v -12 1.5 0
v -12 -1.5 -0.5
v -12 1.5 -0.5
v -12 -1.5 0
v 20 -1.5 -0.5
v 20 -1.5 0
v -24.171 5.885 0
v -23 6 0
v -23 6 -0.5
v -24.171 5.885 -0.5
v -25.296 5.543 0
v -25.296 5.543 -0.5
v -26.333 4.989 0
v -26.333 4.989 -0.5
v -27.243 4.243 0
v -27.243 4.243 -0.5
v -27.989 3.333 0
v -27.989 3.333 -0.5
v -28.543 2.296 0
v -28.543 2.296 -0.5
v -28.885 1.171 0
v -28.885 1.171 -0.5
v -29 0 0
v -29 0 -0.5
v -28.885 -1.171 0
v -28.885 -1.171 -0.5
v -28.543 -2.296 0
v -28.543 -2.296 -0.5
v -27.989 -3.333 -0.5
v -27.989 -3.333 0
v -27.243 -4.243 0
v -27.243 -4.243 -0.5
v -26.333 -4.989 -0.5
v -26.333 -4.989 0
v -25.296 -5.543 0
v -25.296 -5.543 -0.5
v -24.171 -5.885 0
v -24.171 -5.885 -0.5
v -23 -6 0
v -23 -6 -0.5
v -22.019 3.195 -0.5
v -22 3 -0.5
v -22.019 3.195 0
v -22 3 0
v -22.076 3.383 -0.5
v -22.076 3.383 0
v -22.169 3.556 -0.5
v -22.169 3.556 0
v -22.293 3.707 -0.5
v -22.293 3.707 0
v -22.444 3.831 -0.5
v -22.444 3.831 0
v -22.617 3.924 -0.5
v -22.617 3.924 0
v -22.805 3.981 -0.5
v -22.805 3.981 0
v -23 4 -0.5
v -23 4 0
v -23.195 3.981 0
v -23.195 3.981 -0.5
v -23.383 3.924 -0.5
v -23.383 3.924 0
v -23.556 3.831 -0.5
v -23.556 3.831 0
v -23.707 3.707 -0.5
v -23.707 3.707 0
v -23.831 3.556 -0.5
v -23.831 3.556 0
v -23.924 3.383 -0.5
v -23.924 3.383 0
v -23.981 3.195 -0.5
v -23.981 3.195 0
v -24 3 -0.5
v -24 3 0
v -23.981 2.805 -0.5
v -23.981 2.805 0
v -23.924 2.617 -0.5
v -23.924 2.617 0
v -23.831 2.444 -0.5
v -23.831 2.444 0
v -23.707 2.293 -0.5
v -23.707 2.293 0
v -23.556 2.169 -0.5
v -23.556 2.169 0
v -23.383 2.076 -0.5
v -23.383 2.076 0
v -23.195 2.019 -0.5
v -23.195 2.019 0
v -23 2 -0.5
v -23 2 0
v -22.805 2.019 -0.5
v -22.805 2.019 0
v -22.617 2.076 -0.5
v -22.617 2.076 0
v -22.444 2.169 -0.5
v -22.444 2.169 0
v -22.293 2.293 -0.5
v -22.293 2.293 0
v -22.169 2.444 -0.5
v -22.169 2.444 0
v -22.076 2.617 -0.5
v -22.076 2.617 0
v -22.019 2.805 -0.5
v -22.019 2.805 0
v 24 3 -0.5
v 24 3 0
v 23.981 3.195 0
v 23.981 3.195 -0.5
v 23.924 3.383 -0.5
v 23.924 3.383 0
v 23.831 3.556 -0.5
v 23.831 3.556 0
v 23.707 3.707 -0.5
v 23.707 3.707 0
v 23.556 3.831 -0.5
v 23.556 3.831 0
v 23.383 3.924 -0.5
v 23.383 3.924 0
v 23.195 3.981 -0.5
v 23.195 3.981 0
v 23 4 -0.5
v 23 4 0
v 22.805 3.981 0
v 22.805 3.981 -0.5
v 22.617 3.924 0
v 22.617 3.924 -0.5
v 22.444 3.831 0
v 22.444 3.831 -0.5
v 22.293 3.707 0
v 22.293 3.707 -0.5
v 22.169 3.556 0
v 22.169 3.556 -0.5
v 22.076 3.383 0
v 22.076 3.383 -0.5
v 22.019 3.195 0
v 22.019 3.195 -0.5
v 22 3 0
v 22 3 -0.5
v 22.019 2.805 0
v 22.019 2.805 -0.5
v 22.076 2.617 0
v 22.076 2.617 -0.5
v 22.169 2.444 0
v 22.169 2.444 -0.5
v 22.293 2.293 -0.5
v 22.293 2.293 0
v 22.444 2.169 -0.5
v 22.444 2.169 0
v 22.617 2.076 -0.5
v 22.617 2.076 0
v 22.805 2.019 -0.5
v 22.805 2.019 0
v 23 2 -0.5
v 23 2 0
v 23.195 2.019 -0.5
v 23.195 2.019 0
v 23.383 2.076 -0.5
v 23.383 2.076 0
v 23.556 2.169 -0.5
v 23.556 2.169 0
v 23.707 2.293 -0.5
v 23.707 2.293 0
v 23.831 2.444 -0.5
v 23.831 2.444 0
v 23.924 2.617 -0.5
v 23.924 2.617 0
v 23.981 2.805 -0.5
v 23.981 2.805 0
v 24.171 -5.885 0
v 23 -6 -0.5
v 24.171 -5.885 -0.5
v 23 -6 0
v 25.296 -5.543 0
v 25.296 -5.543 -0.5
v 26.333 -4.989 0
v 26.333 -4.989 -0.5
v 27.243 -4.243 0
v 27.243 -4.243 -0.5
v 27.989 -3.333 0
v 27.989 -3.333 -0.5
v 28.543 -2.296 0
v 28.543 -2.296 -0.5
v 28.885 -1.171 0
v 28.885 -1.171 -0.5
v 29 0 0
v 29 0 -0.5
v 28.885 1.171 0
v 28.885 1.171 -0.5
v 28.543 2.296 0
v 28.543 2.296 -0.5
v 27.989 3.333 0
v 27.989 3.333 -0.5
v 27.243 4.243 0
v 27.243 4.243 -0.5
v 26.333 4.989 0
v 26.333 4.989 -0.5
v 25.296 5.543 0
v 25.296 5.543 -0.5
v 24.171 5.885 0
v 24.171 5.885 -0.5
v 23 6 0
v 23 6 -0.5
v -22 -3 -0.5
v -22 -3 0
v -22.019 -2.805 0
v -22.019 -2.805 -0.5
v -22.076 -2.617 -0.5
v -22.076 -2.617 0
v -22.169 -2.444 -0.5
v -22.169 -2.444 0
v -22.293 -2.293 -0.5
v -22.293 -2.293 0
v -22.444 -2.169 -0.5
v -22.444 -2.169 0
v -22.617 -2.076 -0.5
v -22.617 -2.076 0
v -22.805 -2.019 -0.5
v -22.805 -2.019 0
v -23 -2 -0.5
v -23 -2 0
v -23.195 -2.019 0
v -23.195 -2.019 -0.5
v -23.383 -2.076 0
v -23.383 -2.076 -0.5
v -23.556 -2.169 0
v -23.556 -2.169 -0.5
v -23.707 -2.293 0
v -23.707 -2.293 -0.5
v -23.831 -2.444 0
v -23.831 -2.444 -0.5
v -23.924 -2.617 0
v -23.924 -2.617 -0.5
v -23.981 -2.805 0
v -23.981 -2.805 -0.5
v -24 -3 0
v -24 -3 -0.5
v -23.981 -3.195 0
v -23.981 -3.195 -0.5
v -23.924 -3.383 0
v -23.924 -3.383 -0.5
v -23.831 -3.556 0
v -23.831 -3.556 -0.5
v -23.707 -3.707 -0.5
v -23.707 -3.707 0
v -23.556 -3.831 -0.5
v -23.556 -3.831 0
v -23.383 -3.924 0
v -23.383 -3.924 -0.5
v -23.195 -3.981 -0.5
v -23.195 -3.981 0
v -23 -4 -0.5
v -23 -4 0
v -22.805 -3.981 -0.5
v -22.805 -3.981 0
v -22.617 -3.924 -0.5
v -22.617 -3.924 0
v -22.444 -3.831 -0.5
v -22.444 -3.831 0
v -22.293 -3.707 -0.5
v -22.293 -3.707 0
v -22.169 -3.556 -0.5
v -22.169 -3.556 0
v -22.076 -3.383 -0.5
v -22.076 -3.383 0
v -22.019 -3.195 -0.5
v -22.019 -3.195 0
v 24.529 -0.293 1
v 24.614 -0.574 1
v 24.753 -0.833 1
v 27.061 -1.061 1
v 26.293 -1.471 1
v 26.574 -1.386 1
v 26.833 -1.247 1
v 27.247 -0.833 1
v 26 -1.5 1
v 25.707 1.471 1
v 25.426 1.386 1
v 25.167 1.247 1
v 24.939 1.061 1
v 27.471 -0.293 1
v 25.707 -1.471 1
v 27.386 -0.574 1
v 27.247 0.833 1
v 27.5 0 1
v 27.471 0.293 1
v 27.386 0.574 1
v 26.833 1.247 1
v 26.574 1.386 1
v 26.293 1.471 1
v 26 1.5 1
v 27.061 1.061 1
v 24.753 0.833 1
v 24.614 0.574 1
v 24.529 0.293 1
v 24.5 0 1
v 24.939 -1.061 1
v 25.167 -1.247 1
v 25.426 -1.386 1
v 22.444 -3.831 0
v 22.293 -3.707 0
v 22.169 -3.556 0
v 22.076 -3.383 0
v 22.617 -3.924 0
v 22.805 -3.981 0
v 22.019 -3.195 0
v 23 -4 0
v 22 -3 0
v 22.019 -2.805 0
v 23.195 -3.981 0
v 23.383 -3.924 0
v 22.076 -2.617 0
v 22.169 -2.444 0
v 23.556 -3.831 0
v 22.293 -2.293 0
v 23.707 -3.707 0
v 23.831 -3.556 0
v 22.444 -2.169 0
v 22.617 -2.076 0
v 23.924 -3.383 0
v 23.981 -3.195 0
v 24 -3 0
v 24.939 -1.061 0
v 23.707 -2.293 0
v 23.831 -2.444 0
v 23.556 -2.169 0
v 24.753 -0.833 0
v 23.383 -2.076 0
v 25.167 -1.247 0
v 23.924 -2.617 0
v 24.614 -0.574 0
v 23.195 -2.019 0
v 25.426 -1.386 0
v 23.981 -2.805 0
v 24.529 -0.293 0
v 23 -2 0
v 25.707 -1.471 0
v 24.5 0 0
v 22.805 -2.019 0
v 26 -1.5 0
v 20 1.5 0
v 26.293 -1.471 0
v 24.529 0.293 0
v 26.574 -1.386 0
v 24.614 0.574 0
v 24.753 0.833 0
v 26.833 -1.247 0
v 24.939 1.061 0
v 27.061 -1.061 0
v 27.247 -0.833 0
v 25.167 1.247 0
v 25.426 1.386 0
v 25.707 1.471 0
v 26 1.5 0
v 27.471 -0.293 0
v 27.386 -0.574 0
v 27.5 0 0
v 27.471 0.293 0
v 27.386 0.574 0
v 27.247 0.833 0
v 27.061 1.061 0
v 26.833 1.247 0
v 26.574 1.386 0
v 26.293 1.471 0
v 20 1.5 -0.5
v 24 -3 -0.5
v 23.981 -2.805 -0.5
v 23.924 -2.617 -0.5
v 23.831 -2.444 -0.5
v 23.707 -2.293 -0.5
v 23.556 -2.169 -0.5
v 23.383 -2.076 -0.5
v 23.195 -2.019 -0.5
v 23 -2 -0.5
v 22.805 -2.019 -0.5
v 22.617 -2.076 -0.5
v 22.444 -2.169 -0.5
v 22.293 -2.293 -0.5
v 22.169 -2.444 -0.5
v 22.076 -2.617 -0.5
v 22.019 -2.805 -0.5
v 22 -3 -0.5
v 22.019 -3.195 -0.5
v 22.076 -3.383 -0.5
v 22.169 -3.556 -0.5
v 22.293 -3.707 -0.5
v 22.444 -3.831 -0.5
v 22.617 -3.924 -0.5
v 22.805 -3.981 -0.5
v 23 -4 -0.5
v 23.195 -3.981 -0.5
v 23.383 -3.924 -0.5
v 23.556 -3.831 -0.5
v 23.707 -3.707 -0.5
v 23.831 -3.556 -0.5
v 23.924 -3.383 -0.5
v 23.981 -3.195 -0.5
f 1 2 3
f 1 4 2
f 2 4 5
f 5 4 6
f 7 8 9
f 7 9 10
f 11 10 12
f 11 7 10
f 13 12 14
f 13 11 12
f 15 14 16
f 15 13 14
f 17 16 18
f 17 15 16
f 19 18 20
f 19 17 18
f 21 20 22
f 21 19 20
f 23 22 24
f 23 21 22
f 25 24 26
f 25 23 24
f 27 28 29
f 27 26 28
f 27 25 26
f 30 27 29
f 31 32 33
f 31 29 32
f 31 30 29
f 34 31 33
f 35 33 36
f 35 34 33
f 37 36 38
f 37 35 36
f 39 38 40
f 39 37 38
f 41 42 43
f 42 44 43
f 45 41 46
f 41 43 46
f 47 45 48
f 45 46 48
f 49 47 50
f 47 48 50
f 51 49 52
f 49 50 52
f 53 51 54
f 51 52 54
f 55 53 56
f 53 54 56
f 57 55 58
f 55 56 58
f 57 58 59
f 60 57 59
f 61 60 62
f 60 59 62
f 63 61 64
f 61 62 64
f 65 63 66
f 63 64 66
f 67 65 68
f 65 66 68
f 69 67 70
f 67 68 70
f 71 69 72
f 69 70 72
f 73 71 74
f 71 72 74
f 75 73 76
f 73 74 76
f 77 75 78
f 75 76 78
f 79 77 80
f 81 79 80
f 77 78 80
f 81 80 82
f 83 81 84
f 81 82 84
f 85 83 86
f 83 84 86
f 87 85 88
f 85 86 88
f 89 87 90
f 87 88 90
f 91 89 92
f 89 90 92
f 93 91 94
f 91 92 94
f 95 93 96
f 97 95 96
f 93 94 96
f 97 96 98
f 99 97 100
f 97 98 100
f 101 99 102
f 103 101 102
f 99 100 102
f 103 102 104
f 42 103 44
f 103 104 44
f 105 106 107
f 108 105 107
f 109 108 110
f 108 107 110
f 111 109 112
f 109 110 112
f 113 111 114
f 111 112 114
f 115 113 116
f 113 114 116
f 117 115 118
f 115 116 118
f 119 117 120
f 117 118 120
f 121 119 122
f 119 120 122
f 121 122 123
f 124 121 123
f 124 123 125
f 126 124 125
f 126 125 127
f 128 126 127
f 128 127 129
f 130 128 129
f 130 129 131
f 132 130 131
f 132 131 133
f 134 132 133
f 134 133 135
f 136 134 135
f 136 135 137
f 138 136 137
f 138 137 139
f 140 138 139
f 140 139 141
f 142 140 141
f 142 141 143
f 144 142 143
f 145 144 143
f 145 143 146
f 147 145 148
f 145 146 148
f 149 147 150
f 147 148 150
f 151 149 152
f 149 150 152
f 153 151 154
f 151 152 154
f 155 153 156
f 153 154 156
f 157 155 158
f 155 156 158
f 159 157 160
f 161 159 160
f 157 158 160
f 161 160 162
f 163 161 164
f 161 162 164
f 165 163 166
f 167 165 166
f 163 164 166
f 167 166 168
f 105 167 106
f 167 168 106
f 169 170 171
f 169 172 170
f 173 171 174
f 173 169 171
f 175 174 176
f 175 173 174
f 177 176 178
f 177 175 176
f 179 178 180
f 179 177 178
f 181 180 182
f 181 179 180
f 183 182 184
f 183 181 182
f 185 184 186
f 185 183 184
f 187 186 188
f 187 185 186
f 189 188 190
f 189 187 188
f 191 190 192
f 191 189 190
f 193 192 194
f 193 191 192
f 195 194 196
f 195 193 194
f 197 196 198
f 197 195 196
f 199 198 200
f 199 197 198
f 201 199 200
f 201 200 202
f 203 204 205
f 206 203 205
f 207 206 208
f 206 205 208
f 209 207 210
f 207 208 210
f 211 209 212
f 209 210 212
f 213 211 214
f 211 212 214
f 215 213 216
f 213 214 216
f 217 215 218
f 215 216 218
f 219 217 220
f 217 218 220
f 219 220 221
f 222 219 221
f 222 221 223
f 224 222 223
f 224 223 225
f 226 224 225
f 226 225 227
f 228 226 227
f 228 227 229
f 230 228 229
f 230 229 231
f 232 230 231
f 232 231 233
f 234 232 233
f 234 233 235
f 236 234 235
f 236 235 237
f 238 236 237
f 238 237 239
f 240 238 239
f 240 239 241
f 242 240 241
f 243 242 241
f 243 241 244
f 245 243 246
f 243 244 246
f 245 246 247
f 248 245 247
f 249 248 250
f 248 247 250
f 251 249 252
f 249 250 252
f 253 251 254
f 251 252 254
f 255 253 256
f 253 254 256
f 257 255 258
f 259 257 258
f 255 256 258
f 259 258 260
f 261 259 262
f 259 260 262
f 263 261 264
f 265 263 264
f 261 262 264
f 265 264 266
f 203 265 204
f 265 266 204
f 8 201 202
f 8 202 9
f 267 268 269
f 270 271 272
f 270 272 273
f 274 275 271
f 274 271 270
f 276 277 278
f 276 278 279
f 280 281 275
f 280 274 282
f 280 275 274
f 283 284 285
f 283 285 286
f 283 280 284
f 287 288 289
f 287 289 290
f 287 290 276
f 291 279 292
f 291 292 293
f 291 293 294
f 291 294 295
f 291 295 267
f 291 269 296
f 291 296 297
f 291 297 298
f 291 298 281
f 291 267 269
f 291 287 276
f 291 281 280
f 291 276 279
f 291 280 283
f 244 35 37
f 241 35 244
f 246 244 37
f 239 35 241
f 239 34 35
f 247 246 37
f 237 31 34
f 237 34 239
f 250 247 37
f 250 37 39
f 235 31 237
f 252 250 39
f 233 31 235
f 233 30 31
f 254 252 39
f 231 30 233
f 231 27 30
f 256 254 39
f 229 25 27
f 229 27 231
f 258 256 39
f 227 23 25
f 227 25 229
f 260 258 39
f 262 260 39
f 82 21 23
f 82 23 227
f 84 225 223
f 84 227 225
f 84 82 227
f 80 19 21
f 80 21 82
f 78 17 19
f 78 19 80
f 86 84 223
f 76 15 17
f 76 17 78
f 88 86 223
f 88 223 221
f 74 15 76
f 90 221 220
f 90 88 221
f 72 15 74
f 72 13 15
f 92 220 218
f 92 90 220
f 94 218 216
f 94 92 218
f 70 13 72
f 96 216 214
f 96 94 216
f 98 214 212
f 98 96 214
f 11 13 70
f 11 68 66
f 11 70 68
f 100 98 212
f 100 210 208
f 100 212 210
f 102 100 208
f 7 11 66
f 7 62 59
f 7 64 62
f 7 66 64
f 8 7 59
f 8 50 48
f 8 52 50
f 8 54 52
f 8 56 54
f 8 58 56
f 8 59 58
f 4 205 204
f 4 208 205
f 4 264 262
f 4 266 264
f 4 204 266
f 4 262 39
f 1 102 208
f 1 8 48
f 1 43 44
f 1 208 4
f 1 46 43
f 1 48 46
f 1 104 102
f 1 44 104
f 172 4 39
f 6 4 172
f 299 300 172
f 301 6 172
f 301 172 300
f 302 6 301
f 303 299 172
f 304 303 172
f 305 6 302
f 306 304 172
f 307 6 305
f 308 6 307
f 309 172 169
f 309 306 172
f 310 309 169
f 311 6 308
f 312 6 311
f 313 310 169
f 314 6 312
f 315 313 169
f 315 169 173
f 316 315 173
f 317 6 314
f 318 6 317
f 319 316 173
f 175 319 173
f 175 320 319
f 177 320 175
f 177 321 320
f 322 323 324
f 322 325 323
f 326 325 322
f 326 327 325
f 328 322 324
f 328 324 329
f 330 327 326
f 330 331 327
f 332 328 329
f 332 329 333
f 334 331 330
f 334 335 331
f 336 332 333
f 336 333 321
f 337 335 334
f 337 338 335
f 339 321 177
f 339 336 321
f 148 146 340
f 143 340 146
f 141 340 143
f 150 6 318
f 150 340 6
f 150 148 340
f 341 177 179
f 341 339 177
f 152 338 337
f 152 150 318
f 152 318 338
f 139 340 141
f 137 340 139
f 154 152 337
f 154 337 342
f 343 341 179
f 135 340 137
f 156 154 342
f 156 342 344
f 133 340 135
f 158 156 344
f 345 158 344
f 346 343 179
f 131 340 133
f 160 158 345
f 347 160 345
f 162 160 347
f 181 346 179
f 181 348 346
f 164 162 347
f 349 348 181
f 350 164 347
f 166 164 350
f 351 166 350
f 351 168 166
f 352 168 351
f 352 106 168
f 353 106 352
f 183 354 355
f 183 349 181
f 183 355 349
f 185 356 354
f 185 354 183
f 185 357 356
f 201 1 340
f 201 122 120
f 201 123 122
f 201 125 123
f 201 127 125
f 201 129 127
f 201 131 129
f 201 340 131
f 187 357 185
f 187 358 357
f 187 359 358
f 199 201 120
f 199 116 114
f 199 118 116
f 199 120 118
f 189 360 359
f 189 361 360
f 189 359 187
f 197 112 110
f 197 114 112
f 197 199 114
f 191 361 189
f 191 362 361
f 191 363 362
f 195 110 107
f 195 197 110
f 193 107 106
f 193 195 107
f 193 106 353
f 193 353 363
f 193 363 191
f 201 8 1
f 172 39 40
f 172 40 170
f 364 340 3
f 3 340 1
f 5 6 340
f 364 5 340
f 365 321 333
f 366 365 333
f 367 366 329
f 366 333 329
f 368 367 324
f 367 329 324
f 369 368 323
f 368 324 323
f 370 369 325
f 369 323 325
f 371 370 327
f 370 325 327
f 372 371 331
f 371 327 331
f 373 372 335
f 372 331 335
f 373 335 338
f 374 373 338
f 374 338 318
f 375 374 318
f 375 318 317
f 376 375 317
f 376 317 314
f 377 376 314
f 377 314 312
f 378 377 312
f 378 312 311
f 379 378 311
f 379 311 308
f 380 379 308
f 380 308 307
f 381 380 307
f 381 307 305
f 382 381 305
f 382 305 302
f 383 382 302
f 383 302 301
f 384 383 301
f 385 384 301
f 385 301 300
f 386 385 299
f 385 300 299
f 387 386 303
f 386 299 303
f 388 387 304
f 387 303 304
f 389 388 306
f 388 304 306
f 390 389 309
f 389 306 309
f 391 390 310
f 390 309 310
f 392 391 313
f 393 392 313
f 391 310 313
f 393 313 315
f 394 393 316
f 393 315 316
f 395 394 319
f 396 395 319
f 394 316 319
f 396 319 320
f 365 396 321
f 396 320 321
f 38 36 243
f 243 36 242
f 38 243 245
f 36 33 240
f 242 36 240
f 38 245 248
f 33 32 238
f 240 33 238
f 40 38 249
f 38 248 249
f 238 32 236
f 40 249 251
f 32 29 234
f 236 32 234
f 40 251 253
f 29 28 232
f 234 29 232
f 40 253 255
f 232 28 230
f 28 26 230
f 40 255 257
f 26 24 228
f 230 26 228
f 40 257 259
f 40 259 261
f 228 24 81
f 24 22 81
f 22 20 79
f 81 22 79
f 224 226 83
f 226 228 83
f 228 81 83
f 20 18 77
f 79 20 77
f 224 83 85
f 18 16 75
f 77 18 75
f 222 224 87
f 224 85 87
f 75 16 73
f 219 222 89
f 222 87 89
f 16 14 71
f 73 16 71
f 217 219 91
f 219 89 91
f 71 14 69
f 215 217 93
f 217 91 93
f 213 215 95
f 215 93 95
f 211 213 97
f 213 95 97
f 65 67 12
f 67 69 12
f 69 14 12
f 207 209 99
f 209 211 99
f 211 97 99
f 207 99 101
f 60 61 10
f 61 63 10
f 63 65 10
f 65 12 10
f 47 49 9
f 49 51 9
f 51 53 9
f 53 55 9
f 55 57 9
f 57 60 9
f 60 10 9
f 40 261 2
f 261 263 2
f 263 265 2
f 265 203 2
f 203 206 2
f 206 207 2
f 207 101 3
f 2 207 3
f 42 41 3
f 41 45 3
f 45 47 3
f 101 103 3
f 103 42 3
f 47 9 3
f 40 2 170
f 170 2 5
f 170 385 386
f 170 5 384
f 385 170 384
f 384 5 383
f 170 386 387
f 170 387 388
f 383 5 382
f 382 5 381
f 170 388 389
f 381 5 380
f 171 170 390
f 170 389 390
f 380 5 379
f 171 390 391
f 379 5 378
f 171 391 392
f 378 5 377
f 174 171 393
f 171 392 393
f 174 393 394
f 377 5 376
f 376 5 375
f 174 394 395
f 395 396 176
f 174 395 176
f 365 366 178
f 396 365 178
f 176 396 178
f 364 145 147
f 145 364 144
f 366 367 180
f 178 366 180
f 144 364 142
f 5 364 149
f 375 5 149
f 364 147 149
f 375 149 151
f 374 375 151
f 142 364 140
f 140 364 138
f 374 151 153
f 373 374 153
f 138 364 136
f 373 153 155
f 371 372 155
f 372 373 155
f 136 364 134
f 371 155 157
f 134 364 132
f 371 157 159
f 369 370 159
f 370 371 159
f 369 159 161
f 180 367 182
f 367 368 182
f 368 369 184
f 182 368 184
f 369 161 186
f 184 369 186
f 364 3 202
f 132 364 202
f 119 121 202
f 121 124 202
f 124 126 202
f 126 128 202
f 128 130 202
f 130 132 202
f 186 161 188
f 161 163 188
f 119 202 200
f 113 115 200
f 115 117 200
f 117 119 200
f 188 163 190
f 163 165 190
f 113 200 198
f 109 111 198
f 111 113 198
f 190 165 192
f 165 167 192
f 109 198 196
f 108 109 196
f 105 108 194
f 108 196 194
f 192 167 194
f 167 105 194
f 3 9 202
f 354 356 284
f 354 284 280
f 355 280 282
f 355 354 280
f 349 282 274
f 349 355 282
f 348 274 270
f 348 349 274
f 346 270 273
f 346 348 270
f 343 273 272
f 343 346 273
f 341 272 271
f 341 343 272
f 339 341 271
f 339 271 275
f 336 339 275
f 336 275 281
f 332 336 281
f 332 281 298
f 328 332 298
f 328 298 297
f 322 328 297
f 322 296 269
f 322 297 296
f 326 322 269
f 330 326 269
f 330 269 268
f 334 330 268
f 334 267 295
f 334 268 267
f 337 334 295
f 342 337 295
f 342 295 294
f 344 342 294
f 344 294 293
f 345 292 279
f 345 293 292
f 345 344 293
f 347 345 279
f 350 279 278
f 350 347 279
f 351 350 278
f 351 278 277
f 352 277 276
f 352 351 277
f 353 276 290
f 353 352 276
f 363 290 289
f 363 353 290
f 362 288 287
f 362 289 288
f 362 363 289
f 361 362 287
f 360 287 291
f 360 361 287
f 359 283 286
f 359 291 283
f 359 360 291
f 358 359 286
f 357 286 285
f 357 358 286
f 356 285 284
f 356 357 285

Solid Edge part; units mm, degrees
sketch "Sketch1" plane through (0, 0, 0) normal (0, 0, 1) x (1, 0, 0)
  line L0 (-23, -6) -> (23, -6)
  arc A0 (23, 6) -> (23, -6) centre (23, 0) cw
  line L1 (23, 6) -> (-23, 6)
  arc A1 (-23, -6) -> (-23, 6) centre (-23, 0) cw
extrude "Protrusion1" add sketch "Sketch1" against normal blind 0.5
sketch "Sketch2" plane through (0, 0, 0) normal (0, 0, 1) x (1, 0, 0)
  circle A0 centre (26, 0) radius 1.5
extrude "ExtrudedProtrusion_2" add sketch "Sketch2" along normal blind 1
sketch "Sketch3" plane through (0, 0, 0) normal (0, 0, 1) x (1, 0, 0)
  line L0 (-12, -1.5) -> (20, -1.5)
  line L1 (20, -1.5) -> (20, 1.5)
  line L2 (20, 1.5) -> (-12, 1.5)
  line L3 (-12, -1.5) -> (-12, 1.5)
extrude "ExtrudedCutout_1" cut sketch "Sketch3" against normal blind 0.5
sketch "Sketch4" plane through (0, 0, 0) normal (0, 0, 1) x (1, 0, 0)
  circle A0 centre (-23, 3) radius 1
extrude "ExtrudedCutout_2" cut sketch "Sketch4" against normal blind 0.5
sketch "Sketch5" plane through (0, 0, 0) normal (0, 0, 1) x (1, 0, 0)
  circle A0 centre (-23, -3) radius 1
extrude "ExtrudedCutout_3" cut sketch "Sketch5" against normal blind 0.5
sketch "Sketch6" plane through (0, 0, 0) normal (0, 0, 1) x (1, 0, 0)
  circle A0 centre (23, 3) radius 1
extrude "ExtrudedCutout_4" cut sketch "Sketch6" against normal blind 0.5
sketch "Sketch7" plane through (0, 0, 0) normal (0, 0, 1) x (1, 0, 0)
  circle A0 centre (23, -3) radius 1
extrude "ExtrudedCutout_5" cut sketch "Sketch7" against normal blind 0.5
